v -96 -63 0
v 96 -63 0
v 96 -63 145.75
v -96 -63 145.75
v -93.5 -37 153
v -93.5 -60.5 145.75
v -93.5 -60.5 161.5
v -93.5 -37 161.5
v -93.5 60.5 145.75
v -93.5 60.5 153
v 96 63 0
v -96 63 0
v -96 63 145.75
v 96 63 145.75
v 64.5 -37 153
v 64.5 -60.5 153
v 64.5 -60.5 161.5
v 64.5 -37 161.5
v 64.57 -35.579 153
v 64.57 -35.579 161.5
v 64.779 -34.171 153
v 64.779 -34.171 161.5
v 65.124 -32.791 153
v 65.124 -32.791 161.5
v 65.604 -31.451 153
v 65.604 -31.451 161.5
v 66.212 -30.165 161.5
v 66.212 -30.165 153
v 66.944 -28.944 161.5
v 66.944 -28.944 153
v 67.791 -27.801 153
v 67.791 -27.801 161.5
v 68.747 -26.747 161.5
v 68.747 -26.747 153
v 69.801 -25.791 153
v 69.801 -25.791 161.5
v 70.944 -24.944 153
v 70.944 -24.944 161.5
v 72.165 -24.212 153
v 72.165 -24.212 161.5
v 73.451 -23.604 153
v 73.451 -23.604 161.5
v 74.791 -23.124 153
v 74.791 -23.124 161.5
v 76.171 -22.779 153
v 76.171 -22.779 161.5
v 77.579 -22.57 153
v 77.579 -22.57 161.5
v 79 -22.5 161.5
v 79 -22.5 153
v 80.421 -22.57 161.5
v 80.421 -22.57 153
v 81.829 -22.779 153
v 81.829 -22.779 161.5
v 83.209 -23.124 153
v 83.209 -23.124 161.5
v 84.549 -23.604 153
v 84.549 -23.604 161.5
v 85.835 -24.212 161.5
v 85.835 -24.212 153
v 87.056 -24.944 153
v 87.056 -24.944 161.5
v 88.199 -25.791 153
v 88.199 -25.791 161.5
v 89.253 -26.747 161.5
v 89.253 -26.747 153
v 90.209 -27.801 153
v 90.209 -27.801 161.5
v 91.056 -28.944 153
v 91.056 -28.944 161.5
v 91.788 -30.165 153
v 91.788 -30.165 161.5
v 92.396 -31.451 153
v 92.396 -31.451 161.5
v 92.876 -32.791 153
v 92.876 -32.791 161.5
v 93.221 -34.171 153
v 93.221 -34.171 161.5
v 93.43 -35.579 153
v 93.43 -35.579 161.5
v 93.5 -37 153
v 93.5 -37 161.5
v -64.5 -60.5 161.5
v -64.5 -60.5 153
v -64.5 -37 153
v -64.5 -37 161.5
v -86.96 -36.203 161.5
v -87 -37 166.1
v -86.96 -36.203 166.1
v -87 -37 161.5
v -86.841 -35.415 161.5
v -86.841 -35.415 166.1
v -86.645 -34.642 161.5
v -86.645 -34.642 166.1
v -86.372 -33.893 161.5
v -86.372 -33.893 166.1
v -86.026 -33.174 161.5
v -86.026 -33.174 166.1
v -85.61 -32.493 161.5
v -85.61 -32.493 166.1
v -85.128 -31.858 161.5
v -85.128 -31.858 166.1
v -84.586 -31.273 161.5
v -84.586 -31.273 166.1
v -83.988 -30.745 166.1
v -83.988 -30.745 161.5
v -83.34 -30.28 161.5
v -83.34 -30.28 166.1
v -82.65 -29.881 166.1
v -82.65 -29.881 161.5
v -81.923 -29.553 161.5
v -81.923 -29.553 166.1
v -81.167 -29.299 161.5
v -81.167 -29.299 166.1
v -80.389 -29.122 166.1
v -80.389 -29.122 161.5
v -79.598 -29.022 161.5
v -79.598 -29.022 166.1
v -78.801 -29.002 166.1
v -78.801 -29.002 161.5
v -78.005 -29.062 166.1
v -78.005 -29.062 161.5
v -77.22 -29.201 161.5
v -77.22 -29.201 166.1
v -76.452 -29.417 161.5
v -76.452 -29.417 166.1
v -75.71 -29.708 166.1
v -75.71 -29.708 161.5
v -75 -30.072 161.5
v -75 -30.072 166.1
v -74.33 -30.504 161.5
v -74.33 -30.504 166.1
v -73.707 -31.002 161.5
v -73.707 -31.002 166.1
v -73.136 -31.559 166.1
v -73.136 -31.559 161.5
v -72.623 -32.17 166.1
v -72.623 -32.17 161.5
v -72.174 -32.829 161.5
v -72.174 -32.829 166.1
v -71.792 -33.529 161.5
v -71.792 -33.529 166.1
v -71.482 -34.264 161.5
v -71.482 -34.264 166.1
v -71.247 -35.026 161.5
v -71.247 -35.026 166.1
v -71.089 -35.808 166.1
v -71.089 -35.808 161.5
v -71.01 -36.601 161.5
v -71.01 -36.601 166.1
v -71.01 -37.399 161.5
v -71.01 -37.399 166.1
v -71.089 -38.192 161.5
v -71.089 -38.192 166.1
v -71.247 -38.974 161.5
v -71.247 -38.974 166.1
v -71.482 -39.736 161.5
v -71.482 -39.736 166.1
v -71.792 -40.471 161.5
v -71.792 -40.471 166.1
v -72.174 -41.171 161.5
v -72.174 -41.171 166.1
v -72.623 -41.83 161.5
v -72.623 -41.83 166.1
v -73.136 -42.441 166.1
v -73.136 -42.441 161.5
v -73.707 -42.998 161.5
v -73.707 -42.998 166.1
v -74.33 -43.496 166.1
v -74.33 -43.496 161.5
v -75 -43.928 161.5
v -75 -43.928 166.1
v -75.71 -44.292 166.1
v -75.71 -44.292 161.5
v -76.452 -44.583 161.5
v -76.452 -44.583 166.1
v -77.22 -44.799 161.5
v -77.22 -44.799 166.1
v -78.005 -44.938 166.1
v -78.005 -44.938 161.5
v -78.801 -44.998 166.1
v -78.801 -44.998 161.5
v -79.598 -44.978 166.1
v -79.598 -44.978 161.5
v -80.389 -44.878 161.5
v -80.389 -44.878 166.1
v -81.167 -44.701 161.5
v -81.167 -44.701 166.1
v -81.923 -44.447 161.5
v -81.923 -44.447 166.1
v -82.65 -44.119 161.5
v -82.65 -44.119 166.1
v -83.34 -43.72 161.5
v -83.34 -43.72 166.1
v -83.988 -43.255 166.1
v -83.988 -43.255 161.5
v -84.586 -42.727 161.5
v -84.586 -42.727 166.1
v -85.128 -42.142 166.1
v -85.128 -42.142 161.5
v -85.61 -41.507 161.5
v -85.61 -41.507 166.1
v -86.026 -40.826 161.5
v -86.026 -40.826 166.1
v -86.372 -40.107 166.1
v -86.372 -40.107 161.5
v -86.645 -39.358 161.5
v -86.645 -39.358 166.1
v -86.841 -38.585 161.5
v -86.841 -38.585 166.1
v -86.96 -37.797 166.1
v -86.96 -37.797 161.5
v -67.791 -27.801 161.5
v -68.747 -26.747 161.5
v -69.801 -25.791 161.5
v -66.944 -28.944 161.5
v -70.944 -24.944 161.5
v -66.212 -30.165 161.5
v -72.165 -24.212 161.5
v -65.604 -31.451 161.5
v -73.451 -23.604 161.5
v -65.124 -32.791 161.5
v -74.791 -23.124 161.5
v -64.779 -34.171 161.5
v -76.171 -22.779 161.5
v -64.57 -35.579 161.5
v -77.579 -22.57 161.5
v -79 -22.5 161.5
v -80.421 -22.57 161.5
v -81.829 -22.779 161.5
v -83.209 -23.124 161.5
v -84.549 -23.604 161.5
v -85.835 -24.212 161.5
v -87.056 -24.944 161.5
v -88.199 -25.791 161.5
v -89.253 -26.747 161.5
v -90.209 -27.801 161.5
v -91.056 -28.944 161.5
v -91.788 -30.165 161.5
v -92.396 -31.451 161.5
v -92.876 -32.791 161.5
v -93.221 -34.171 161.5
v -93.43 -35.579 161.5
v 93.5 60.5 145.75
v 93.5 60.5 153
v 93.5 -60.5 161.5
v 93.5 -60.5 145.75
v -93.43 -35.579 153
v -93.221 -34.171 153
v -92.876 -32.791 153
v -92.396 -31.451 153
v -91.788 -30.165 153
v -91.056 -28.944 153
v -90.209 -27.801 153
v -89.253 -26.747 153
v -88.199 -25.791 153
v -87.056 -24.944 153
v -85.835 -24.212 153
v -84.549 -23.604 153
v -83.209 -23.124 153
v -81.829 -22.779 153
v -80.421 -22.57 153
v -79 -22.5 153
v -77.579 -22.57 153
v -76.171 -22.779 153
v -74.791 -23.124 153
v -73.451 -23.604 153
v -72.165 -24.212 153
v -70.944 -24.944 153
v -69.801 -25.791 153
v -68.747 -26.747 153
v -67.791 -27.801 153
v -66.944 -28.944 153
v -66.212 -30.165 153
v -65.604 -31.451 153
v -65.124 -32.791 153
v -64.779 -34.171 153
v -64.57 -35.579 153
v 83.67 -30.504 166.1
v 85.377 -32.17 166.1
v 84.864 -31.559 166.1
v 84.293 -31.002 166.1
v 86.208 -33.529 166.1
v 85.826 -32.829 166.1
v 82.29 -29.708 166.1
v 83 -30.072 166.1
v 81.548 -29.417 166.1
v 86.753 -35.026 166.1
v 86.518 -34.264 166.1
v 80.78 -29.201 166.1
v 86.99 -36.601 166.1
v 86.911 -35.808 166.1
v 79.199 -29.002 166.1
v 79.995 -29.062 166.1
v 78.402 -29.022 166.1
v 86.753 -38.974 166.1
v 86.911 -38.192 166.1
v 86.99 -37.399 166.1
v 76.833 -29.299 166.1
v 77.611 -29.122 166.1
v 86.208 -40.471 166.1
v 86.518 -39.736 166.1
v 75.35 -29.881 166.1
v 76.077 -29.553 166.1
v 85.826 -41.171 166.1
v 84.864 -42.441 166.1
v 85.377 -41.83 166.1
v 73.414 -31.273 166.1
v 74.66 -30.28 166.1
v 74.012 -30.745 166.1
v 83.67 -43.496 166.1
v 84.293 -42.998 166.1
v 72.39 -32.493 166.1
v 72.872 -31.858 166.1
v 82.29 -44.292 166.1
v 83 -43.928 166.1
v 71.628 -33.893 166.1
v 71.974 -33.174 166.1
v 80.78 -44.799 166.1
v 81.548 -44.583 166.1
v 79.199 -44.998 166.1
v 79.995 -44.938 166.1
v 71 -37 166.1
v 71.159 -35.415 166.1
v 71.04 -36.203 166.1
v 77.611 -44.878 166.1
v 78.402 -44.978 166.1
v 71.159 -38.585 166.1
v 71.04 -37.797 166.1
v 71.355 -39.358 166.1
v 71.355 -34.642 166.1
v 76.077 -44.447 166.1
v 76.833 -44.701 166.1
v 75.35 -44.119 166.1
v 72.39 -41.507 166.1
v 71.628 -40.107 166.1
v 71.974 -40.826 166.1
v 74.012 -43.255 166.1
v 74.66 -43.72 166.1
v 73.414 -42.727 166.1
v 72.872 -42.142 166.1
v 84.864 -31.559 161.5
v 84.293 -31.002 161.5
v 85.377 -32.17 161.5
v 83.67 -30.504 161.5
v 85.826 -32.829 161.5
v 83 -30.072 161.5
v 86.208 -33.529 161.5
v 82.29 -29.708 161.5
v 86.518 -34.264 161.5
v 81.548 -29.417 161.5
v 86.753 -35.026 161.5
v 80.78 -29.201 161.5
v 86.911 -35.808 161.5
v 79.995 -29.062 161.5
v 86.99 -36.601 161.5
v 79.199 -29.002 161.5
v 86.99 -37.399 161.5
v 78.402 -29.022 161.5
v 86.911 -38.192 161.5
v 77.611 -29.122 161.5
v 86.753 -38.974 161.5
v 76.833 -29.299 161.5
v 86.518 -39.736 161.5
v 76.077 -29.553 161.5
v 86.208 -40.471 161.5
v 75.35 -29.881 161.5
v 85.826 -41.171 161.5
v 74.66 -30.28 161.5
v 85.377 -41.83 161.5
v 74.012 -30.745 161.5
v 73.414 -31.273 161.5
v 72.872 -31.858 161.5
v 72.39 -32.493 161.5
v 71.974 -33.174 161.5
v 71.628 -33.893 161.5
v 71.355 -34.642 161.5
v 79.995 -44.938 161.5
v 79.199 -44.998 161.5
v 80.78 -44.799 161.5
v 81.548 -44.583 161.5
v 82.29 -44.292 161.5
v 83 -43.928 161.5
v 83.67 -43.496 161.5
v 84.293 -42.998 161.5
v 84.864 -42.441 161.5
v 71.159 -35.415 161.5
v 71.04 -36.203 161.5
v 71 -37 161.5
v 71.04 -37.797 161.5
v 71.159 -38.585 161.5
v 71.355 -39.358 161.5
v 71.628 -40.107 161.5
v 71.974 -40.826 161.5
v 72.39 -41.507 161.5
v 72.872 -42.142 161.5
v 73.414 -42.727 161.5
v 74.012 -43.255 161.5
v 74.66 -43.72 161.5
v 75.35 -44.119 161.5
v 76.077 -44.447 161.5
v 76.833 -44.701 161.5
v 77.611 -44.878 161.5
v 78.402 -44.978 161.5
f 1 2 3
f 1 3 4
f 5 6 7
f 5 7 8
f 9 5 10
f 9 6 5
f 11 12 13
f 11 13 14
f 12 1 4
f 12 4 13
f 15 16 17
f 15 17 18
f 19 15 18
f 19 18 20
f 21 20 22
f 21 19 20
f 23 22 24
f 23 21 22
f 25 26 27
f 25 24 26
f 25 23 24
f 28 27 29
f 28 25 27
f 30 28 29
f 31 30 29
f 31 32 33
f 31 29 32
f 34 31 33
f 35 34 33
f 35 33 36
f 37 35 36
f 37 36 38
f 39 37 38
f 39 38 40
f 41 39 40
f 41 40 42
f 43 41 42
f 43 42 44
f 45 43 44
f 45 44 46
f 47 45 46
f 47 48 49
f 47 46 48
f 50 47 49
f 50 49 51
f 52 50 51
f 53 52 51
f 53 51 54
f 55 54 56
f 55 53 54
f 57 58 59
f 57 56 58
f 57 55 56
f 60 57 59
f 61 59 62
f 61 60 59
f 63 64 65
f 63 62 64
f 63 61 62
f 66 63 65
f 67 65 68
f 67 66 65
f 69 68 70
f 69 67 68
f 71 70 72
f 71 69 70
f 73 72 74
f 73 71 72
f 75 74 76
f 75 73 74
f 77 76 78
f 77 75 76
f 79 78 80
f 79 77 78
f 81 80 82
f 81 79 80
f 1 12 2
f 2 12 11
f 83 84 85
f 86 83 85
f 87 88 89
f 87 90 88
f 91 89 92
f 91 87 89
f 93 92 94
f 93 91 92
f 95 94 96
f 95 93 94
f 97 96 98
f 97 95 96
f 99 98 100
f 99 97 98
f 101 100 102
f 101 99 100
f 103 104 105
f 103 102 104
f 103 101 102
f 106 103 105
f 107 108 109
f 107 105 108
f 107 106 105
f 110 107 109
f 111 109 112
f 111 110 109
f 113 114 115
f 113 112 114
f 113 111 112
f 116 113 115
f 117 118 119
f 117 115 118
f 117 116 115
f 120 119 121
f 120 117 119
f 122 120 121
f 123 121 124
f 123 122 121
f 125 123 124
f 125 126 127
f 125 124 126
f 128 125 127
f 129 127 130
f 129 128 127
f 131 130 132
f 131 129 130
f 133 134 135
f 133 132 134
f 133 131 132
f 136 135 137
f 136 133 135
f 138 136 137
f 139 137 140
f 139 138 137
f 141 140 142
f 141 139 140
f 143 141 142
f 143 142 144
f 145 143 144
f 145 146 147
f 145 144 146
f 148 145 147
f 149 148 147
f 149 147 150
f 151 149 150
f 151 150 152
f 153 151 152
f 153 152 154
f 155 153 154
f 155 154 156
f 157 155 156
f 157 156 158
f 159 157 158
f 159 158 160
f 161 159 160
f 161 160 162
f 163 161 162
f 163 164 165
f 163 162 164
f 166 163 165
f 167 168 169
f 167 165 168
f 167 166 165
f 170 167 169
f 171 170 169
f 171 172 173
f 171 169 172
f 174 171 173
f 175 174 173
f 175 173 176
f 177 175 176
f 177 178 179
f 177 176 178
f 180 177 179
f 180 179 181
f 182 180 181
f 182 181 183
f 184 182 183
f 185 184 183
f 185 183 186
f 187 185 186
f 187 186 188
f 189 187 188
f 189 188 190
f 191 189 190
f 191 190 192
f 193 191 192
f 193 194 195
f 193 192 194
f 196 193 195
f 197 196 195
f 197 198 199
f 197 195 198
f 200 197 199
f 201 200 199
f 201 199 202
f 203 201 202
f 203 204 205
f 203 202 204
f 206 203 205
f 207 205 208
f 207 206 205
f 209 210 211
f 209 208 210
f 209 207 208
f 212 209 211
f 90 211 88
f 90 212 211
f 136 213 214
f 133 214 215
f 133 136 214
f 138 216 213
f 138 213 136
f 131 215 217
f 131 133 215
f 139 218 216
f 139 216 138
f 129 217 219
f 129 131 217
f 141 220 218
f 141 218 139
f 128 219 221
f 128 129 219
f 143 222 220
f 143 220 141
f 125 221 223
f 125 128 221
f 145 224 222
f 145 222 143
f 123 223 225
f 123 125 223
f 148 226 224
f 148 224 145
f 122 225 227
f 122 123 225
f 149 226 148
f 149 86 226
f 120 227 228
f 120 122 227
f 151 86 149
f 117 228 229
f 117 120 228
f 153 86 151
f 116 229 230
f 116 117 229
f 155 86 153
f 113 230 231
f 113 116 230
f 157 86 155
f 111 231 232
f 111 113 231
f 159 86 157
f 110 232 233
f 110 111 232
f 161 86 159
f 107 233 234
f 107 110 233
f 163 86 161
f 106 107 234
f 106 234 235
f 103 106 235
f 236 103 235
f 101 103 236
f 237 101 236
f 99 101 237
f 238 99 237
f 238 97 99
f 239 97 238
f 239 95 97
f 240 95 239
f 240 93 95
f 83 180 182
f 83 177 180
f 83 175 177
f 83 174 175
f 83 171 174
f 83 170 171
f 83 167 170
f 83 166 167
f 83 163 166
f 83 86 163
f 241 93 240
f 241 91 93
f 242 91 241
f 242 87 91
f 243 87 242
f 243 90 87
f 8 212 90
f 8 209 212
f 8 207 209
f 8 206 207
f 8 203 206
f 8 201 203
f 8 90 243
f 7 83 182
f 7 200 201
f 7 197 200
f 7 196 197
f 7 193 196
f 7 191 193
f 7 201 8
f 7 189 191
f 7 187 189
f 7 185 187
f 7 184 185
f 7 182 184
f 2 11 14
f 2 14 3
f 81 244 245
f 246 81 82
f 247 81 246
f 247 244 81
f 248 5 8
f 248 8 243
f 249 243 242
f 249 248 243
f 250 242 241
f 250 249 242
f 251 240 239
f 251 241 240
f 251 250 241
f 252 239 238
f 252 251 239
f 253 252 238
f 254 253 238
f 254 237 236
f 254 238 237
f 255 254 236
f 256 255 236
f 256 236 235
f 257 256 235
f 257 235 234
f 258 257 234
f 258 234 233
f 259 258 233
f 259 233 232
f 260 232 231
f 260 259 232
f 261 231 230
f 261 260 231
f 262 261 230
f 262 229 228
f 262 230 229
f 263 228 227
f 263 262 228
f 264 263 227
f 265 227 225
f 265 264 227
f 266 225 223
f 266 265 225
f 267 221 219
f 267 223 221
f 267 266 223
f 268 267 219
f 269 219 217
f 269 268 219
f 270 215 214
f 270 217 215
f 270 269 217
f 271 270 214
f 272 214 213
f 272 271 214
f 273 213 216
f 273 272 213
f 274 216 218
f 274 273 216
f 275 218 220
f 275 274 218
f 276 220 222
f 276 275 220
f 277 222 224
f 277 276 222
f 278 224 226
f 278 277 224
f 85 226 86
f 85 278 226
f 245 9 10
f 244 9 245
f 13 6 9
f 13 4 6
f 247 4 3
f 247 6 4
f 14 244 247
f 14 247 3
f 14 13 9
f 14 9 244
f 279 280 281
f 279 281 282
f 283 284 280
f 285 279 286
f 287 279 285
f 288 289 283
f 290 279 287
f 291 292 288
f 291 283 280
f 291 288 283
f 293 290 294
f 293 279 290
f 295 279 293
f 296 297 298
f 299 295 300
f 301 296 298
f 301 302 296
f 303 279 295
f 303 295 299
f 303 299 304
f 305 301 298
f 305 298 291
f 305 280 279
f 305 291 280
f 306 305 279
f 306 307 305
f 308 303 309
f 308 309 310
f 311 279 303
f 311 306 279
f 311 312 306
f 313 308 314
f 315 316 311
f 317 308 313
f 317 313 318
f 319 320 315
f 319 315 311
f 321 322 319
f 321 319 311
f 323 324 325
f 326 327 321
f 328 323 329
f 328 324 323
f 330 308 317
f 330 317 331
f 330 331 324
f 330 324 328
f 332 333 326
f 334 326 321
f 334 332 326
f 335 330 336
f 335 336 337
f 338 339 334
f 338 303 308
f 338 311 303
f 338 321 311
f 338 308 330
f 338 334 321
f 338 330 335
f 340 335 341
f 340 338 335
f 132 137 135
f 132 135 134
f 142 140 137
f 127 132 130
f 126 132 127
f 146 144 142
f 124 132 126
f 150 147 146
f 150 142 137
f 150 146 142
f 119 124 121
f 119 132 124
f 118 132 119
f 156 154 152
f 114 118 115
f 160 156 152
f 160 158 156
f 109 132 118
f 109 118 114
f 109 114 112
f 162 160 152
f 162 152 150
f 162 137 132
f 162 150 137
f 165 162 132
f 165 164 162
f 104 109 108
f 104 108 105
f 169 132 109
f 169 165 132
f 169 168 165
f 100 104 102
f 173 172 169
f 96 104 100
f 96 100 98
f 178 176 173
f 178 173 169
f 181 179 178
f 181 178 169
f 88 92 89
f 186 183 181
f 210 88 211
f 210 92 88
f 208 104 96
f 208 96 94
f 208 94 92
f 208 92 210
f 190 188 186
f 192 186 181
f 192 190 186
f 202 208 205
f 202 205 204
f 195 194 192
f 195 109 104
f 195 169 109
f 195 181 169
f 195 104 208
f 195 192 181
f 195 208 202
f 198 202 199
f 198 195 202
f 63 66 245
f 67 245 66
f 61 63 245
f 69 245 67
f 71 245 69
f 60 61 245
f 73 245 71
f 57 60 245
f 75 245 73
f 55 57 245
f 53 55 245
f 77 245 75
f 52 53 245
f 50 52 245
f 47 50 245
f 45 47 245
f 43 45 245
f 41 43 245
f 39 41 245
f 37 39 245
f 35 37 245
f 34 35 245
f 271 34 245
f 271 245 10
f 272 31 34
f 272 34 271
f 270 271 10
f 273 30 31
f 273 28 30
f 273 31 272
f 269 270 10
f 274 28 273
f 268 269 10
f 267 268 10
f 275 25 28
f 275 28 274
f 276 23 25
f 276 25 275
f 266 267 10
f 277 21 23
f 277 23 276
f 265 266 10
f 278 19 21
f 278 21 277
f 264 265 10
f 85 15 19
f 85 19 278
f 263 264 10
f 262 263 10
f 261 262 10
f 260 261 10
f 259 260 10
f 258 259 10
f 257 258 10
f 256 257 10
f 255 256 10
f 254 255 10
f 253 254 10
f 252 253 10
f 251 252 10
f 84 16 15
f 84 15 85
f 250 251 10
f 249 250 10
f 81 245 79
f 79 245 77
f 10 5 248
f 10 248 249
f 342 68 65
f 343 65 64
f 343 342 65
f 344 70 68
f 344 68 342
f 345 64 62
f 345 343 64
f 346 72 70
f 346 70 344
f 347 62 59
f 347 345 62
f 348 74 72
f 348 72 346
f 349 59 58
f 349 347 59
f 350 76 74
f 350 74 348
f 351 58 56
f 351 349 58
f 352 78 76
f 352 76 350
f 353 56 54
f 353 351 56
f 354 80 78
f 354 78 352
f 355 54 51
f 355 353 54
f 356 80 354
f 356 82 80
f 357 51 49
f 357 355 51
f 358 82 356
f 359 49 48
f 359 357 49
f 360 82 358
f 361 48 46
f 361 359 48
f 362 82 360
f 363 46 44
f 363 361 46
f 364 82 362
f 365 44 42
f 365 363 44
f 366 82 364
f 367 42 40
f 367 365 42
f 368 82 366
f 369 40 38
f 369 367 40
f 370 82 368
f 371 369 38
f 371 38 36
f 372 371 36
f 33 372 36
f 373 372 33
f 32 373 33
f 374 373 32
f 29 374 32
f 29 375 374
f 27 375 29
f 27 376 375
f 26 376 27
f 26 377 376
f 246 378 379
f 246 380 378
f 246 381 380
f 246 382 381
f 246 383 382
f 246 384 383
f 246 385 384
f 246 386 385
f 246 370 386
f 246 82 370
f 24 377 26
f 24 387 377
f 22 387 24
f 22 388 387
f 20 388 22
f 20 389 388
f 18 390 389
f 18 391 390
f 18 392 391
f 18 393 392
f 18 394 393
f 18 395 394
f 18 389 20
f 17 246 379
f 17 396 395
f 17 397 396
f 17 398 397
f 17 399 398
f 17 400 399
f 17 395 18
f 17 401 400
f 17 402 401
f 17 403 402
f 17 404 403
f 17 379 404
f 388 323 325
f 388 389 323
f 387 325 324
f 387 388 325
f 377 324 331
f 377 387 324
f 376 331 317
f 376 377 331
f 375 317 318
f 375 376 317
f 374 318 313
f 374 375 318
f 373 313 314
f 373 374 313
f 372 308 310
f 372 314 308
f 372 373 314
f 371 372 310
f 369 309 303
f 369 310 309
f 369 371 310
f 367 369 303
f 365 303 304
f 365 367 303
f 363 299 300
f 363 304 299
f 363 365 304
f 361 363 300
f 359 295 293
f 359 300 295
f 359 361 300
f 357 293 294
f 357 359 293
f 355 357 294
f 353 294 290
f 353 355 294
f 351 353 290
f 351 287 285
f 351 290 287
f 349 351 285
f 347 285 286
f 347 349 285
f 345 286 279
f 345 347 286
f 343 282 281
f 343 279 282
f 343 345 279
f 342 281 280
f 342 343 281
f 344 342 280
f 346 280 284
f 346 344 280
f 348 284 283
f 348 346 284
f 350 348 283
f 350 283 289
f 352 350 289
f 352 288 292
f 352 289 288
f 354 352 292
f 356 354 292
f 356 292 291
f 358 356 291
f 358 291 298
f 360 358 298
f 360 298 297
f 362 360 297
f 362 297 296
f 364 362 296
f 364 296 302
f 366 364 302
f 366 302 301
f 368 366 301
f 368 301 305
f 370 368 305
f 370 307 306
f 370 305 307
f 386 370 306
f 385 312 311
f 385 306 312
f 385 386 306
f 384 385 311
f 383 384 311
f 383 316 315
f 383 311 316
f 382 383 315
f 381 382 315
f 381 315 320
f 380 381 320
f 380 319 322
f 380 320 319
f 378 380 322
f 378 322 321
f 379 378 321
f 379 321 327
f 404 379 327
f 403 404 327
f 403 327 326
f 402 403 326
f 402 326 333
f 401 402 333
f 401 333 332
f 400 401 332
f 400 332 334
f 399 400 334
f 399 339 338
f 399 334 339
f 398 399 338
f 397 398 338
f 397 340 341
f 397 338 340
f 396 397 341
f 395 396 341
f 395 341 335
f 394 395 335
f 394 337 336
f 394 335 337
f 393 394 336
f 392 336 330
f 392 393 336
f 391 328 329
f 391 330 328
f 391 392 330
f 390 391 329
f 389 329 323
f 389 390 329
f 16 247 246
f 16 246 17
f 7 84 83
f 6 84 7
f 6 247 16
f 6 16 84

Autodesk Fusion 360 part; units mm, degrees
sketch "Sketch1" plane through (0, 0, 0) normal (0, 0, 1) x (1, 0, 0)
  line L0 (96, -63) -> (-96, -63)
  line L1 (-96, -63) -> (-96, 63)
  line L2 (-96, 63) -> (96, 63)
  line L3 (96, 63) -> (96, -63)
  line L4 (96, -63) -> (-96, 63) construction
  line L5 (-96, -63) -> (96, 63) construction
  dimension "d1" = 192
  dimension "d2" = 126
extrude "Extrude1" add sketch "Sketch1" along normal blind 145.75
sketch "Sketch4" plane through (0, 0, 145.75) normal (0, 0, 1) x (-1, 0, 0)
  line L0 (-96, -63) -> (96, -63)
  line L1 (96, -63) -> (96, 63)
  line L2 (96, 63) -> (-96, 63)
  line L3 (-96, 63) -> (-96, -63)
  line L4 (96, -63) -> (-96, -63)
  line L5 (-96, -63) -> (-96, 63)
  line L6 (-96, 63) -> (96, 63)
  line L7 (96, 63) -> (96, -63)
  line L8 (-93.5, 60.5) -> (93.5, 60.5)
  line L9 (93.5, 60.5) -> (93.5, -60.5)
  line L10 (93.5, -60.5) -> (-93.5, -60.5)
  line L11 (-93.5, -60.5) -> (-93.5, 60.5)
  dimension "d12" = 2.5
extrude "Extrude4" add sketch "Sketch4" along normal blind 7.25 contours L8 L9 L10 L11
sketch "Sketch5" plane through (0, 0, 153) normal (0, 0, 1) x (-1, 0, 0)
  line L0 (-93.5, -60.5) -> (93.5, -60.5)
  line L1 (93.5, -60.5) -> (93.5, 60.5)
  line L2 (93.5, 60.5) -> (-93.5, 60.5)
  line L3 (-93.5, 60.5) -> (-93.5, -60.5)
  line L4 (93.5, 60.5) -> (64.5, 60.5)
  line L5 (64.5, 60.5) -> (64.5, 37)
  line L6 (93.5, 37) -> (93.5, 60.5)
  line L7 (-93.5, 60.5) -> (-64.5, 60.5)
  line L8 (-64.5, 60.5) -> (-64.5, 37)
  line L9 (-93.5, 37) -> (-93.5, 60.5)
  arc A0 (64.5, 37) -> (93.5, 37) centre (79, 37) ccw
  arc A1 (-93.5, 37) -> (-64.5, 37) centre (-79, 37) ccw
  dimension "d15" = 14.5
  dimension "d16" = 23.5
extrude "Extrude5" add sketch "Sketch5" along normal blind 8.5 contours L2 L3 L7 L8 L9 A1 | L1 L2 L4 L5 L6 A0
sketch "Sketch6" plane through (0, 0, 161.5) normal (0, 0, 1) x (-1, 0, 0)
  arc A0 (64.5, 37) -> (93.5, 37) centre (79, 37) ccw
  line L0 (93.5, 37) -> (93.5, 60.5)
  line L1 (93.5, 60.5) -> (64.5, 60.5)
  line L2 (64.5, 60.5) -> (64.5, 37)
  circle A1 centre (79, 37) radius 8
  circle A2 centre (-79, 37) radius 8
  arc A3 (-93.5, 37) -> (-64.5, 37) centre (-79, 37) ccw
  dimension "d19" = 16
extrude "Extrude6" add sketch "Sketch6" along normal blind 4.6 contours A1 | A2
equation "d3 = 153 mm - 7.25 mm"
equation "d16 = 38 mm - 14.5 mm"
